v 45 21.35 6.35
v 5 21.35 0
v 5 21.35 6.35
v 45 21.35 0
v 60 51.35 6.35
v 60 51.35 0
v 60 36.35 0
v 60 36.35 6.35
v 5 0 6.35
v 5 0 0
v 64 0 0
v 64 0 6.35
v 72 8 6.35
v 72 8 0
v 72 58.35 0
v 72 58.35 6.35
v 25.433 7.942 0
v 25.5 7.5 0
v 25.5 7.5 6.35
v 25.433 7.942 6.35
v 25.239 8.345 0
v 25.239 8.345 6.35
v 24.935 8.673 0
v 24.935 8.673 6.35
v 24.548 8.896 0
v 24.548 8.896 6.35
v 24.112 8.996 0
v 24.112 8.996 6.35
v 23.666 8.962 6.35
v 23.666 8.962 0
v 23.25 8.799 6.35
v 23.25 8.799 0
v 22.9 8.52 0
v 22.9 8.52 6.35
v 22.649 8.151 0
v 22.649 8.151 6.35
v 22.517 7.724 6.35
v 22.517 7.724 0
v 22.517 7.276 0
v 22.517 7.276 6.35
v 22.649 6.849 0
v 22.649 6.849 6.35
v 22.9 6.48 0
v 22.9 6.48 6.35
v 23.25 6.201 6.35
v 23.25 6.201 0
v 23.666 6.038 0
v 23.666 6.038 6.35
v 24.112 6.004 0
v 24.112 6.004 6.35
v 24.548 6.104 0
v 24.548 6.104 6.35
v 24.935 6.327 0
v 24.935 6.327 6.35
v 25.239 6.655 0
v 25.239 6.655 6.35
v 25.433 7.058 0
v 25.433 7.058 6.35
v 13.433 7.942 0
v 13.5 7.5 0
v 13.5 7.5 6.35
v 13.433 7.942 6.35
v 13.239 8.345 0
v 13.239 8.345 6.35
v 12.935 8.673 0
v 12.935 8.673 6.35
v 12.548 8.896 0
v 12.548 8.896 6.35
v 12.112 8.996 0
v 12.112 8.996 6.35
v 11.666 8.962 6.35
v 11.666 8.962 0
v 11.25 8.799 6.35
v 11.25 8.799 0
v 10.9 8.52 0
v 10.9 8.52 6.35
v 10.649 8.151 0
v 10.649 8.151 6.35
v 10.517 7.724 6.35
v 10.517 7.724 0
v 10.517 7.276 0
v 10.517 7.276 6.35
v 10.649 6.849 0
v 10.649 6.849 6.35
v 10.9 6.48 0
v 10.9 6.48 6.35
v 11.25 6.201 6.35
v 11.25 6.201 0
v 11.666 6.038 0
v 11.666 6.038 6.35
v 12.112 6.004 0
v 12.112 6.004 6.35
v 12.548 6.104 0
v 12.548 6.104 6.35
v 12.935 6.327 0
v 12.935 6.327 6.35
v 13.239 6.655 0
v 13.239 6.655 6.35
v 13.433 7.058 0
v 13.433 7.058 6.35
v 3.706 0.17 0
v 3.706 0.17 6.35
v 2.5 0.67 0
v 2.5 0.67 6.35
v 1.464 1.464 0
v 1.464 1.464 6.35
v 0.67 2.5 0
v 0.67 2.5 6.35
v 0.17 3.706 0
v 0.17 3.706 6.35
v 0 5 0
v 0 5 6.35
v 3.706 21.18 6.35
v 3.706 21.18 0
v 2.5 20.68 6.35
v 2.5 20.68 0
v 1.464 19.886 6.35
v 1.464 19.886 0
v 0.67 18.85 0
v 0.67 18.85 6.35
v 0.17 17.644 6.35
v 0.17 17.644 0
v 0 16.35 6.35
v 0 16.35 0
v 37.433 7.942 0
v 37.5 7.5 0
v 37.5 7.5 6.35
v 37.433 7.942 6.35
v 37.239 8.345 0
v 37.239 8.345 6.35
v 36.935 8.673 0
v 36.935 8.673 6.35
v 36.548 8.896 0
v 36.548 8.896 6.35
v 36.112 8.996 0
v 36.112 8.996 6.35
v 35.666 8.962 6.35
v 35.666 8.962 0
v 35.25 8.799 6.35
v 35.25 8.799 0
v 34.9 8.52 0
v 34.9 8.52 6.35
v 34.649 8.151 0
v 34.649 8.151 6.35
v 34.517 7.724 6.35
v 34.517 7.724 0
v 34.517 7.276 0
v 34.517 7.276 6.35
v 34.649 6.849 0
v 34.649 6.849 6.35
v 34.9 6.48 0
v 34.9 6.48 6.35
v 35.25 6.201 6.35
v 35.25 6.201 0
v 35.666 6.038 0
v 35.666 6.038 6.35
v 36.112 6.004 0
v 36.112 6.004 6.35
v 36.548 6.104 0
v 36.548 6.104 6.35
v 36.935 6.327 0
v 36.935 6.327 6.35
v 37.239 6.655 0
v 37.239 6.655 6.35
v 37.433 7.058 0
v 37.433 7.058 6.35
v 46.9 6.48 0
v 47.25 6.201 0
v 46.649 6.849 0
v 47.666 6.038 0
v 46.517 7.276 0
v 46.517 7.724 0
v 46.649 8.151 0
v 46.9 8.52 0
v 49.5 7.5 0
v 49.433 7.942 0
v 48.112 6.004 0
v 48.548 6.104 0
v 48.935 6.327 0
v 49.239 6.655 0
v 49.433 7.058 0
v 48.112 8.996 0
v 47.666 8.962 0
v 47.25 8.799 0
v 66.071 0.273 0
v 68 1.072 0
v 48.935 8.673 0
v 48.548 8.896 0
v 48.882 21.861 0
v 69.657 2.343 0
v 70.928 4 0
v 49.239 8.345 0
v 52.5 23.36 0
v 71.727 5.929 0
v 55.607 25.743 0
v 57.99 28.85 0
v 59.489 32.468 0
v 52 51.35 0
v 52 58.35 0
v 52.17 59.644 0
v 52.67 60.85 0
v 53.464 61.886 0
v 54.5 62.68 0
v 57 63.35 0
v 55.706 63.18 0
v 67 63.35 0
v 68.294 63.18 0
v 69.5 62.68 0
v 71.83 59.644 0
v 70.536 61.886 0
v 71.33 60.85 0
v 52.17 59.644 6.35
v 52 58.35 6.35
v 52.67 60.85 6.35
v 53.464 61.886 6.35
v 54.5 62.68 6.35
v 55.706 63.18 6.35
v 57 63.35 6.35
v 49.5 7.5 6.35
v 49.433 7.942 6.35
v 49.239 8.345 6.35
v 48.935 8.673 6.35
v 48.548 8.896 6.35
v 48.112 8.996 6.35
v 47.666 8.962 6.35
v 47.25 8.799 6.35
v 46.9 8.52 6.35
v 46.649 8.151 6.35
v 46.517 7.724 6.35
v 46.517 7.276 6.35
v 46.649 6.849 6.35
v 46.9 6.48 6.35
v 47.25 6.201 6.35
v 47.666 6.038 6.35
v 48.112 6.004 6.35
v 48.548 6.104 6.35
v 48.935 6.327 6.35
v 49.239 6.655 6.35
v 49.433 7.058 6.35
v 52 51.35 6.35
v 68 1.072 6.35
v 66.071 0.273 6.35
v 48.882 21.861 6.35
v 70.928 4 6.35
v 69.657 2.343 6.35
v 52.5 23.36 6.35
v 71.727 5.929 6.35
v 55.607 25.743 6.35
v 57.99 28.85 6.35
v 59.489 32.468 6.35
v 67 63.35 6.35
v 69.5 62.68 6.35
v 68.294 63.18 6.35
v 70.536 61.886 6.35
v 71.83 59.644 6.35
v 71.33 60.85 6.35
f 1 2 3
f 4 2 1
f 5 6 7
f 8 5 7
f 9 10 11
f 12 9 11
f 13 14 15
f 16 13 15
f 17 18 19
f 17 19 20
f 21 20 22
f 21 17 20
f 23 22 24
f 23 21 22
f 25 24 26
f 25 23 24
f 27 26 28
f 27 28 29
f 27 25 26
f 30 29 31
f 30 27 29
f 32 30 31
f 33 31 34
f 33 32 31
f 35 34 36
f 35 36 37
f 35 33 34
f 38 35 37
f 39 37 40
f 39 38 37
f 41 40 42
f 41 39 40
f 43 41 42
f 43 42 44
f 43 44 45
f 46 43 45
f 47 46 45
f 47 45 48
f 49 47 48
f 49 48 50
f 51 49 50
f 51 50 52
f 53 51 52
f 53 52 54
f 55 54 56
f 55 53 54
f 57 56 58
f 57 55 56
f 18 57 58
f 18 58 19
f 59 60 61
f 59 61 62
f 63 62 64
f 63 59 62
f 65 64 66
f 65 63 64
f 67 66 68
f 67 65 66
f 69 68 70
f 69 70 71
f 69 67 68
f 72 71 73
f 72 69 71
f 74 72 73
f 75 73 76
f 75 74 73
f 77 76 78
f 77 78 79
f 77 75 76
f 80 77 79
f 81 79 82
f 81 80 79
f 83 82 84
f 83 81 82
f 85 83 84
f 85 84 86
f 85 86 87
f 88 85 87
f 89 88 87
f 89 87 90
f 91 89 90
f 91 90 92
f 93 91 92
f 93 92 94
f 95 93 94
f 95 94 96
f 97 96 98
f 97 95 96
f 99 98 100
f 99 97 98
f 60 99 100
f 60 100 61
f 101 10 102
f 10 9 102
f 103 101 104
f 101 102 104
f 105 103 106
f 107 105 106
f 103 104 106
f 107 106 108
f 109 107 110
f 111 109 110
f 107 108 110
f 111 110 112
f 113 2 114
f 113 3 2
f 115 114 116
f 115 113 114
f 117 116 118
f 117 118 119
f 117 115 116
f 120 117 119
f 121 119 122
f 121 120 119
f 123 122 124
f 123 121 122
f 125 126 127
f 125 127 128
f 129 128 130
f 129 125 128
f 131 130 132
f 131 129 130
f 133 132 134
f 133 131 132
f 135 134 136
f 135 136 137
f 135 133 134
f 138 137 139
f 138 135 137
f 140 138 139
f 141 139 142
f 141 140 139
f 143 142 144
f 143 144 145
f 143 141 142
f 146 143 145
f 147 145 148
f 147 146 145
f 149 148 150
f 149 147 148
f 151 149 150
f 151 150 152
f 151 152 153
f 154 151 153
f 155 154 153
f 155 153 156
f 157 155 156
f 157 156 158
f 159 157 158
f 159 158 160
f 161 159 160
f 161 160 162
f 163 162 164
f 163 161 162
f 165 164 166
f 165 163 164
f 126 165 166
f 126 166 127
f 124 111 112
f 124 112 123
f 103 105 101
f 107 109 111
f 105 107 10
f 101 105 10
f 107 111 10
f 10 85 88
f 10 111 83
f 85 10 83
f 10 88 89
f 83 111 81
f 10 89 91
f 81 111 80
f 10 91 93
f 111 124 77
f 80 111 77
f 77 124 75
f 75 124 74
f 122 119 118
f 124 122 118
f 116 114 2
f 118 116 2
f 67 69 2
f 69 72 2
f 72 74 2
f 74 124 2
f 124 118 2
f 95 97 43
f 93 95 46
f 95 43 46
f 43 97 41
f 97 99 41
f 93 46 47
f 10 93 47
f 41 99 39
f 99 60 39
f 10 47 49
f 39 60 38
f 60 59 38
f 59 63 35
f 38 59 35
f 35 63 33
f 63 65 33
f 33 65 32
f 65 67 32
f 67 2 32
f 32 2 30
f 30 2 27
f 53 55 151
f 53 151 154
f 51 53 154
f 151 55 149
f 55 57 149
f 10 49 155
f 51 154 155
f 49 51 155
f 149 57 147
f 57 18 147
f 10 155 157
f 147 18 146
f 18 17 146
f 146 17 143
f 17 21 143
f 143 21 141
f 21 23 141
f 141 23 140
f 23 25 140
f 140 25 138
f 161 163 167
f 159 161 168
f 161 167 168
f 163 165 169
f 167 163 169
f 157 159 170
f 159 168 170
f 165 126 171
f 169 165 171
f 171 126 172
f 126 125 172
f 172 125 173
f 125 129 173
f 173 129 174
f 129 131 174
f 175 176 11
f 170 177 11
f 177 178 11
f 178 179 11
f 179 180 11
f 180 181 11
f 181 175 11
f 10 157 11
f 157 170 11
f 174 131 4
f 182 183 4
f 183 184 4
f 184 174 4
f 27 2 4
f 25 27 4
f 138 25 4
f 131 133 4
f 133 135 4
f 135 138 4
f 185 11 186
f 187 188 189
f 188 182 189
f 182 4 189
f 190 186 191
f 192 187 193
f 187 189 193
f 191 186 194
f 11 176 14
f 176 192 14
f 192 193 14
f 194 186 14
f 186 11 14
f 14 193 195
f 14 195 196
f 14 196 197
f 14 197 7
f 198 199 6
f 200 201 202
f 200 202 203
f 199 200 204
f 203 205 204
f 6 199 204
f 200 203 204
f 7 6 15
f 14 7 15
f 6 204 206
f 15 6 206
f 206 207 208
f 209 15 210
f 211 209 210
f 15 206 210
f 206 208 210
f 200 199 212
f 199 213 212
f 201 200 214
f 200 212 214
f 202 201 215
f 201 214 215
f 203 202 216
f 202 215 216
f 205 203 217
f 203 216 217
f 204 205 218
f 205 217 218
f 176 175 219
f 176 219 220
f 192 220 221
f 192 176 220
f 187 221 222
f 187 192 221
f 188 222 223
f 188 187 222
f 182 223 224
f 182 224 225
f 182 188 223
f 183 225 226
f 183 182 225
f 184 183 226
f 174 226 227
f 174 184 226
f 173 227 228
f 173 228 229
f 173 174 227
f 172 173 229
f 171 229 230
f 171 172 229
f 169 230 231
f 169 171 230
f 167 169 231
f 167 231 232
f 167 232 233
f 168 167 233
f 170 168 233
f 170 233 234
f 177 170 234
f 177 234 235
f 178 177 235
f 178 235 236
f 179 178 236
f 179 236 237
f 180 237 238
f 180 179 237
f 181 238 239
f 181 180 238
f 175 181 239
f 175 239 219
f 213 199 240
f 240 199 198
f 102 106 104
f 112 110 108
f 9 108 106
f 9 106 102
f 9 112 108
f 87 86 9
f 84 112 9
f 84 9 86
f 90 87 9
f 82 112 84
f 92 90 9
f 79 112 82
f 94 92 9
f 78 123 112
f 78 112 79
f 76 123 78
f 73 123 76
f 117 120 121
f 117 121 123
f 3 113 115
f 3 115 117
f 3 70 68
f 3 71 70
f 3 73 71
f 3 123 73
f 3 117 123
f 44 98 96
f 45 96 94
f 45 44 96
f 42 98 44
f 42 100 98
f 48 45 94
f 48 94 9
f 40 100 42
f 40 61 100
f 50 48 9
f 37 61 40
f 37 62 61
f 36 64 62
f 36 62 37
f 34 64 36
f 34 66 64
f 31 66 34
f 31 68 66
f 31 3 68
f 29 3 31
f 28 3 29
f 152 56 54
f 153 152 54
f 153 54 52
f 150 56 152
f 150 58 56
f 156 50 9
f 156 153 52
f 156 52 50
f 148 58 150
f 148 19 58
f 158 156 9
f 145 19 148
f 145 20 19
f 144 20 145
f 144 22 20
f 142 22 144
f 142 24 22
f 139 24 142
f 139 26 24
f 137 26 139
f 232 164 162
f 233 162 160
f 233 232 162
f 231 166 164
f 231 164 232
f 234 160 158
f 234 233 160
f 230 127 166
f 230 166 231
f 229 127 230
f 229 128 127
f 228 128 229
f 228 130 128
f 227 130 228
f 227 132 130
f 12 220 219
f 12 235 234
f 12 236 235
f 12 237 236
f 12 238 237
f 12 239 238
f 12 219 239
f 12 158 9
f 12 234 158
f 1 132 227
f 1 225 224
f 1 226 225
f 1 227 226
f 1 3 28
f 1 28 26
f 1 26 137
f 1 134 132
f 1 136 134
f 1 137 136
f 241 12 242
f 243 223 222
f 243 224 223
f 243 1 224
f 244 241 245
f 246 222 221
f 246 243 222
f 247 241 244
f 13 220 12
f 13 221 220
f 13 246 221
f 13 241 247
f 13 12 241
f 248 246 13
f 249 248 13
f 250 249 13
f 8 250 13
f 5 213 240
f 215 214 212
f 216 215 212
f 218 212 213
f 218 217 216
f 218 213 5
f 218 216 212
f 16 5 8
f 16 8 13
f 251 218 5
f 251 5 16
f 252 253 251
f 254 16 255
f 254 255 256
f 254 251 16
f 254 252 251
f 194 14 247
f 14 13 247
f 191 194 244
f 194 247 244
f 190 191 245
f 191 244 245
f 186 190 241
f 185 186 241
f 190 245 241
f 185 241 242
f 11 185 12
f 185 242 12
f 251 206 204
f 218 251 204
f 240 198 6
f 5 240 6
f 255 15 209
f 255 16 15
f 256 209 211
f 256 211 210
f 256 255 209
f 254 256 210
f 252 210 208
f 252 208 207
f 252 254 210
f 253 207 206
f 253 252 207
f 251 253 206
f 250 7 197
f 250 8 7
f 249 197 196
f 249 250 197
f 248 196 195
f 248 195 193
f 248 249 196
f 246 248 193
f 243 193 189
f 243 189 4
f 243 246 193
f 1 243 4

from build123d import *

# Parameters (mm, degrees)
SKETCH1_W           = 60
SKETCH1_H           = 21.35
SKETCH1_R           = 1.5
BOSS_EXTRUDE1_DEPTH = 6.35
FILLET1_R           = 15
FILLET3_R           = 5
FILLET5_R           = 5
FILLET6_R           = 5
FILLET7_R           = 8


with BuildPart() as part:
    # Sketch1 → Boss-Extrude1 (new body)
    with BuildSketch(Plane.XY):
        with Locations((30, 10.675)):
            Rectangle(SKETCH1_W, SKETCH1_H)
        with Locations((12, 7.5)):
            Circle(SKETCH1_R, mode=Mode.SUBTRACT)
        with Locations((24, 7.5)):
            Circle(SKETCH1_R, mode=Mode.SUBTRACT)
        with Locations((36, 7.5)):
            Circle(SKETCH1_R, mode=Mode.SUBTRACT)
        with Locations((48, 7.5)):
            Circle(SKETCH1_R, mode=Mode.SUBTRACT)
        Polygon((60, 21.35), (60, 0), (72, 0), (72, 51.35), (60, 51.35), align=None)
        Polygon((52, 51.35), (60, 51.35), (72, 51.35), (72, 63.35), (52, 63.35), align=None)
    extrude(amount=BOSS_EXTRUDE1_DEPTH)

    # Fillet1
    fillet1_edges = [part.edges().sort_by_distance(p)[0] for p in [
        (60, 21.35, 3.175),
    ]]
    fillet(fillet1_edges, radius=FILLET1_R)

    # Fillet3
    fillet3_edges = [part.edges().sort_by_distance(p)[0] for p in [
        (52, 63.35, 3.175),
    ]]
    fillet(fillet3_edges, radius=FILLET3_R)

    # Fillet5
    fillet5_edges = [part.edges().sort_by_distance(p)[0] for p in [
        (0, 0, 3.175),
        (0, 21.35, 3.175),
    ]]
    fillet(fillet5_edges, radius=FILLET5_R)

    # Fillet6
    fillet6_edges = [part.edges().sort_by_distance(p)[0] for p in [
        (72, 63.35, 3.175),
    ]]
    fillet(fillet6_edges, radius=FILLET6_R)

    # Fillet7
    fillet7_edges = [part.edges().sort_by_distance(p)[0] for p in [
        (72, 0, 3.175),
    ]]
    fillet(fillet7_edges, radius=FILLET7_R)


solid = part.part
